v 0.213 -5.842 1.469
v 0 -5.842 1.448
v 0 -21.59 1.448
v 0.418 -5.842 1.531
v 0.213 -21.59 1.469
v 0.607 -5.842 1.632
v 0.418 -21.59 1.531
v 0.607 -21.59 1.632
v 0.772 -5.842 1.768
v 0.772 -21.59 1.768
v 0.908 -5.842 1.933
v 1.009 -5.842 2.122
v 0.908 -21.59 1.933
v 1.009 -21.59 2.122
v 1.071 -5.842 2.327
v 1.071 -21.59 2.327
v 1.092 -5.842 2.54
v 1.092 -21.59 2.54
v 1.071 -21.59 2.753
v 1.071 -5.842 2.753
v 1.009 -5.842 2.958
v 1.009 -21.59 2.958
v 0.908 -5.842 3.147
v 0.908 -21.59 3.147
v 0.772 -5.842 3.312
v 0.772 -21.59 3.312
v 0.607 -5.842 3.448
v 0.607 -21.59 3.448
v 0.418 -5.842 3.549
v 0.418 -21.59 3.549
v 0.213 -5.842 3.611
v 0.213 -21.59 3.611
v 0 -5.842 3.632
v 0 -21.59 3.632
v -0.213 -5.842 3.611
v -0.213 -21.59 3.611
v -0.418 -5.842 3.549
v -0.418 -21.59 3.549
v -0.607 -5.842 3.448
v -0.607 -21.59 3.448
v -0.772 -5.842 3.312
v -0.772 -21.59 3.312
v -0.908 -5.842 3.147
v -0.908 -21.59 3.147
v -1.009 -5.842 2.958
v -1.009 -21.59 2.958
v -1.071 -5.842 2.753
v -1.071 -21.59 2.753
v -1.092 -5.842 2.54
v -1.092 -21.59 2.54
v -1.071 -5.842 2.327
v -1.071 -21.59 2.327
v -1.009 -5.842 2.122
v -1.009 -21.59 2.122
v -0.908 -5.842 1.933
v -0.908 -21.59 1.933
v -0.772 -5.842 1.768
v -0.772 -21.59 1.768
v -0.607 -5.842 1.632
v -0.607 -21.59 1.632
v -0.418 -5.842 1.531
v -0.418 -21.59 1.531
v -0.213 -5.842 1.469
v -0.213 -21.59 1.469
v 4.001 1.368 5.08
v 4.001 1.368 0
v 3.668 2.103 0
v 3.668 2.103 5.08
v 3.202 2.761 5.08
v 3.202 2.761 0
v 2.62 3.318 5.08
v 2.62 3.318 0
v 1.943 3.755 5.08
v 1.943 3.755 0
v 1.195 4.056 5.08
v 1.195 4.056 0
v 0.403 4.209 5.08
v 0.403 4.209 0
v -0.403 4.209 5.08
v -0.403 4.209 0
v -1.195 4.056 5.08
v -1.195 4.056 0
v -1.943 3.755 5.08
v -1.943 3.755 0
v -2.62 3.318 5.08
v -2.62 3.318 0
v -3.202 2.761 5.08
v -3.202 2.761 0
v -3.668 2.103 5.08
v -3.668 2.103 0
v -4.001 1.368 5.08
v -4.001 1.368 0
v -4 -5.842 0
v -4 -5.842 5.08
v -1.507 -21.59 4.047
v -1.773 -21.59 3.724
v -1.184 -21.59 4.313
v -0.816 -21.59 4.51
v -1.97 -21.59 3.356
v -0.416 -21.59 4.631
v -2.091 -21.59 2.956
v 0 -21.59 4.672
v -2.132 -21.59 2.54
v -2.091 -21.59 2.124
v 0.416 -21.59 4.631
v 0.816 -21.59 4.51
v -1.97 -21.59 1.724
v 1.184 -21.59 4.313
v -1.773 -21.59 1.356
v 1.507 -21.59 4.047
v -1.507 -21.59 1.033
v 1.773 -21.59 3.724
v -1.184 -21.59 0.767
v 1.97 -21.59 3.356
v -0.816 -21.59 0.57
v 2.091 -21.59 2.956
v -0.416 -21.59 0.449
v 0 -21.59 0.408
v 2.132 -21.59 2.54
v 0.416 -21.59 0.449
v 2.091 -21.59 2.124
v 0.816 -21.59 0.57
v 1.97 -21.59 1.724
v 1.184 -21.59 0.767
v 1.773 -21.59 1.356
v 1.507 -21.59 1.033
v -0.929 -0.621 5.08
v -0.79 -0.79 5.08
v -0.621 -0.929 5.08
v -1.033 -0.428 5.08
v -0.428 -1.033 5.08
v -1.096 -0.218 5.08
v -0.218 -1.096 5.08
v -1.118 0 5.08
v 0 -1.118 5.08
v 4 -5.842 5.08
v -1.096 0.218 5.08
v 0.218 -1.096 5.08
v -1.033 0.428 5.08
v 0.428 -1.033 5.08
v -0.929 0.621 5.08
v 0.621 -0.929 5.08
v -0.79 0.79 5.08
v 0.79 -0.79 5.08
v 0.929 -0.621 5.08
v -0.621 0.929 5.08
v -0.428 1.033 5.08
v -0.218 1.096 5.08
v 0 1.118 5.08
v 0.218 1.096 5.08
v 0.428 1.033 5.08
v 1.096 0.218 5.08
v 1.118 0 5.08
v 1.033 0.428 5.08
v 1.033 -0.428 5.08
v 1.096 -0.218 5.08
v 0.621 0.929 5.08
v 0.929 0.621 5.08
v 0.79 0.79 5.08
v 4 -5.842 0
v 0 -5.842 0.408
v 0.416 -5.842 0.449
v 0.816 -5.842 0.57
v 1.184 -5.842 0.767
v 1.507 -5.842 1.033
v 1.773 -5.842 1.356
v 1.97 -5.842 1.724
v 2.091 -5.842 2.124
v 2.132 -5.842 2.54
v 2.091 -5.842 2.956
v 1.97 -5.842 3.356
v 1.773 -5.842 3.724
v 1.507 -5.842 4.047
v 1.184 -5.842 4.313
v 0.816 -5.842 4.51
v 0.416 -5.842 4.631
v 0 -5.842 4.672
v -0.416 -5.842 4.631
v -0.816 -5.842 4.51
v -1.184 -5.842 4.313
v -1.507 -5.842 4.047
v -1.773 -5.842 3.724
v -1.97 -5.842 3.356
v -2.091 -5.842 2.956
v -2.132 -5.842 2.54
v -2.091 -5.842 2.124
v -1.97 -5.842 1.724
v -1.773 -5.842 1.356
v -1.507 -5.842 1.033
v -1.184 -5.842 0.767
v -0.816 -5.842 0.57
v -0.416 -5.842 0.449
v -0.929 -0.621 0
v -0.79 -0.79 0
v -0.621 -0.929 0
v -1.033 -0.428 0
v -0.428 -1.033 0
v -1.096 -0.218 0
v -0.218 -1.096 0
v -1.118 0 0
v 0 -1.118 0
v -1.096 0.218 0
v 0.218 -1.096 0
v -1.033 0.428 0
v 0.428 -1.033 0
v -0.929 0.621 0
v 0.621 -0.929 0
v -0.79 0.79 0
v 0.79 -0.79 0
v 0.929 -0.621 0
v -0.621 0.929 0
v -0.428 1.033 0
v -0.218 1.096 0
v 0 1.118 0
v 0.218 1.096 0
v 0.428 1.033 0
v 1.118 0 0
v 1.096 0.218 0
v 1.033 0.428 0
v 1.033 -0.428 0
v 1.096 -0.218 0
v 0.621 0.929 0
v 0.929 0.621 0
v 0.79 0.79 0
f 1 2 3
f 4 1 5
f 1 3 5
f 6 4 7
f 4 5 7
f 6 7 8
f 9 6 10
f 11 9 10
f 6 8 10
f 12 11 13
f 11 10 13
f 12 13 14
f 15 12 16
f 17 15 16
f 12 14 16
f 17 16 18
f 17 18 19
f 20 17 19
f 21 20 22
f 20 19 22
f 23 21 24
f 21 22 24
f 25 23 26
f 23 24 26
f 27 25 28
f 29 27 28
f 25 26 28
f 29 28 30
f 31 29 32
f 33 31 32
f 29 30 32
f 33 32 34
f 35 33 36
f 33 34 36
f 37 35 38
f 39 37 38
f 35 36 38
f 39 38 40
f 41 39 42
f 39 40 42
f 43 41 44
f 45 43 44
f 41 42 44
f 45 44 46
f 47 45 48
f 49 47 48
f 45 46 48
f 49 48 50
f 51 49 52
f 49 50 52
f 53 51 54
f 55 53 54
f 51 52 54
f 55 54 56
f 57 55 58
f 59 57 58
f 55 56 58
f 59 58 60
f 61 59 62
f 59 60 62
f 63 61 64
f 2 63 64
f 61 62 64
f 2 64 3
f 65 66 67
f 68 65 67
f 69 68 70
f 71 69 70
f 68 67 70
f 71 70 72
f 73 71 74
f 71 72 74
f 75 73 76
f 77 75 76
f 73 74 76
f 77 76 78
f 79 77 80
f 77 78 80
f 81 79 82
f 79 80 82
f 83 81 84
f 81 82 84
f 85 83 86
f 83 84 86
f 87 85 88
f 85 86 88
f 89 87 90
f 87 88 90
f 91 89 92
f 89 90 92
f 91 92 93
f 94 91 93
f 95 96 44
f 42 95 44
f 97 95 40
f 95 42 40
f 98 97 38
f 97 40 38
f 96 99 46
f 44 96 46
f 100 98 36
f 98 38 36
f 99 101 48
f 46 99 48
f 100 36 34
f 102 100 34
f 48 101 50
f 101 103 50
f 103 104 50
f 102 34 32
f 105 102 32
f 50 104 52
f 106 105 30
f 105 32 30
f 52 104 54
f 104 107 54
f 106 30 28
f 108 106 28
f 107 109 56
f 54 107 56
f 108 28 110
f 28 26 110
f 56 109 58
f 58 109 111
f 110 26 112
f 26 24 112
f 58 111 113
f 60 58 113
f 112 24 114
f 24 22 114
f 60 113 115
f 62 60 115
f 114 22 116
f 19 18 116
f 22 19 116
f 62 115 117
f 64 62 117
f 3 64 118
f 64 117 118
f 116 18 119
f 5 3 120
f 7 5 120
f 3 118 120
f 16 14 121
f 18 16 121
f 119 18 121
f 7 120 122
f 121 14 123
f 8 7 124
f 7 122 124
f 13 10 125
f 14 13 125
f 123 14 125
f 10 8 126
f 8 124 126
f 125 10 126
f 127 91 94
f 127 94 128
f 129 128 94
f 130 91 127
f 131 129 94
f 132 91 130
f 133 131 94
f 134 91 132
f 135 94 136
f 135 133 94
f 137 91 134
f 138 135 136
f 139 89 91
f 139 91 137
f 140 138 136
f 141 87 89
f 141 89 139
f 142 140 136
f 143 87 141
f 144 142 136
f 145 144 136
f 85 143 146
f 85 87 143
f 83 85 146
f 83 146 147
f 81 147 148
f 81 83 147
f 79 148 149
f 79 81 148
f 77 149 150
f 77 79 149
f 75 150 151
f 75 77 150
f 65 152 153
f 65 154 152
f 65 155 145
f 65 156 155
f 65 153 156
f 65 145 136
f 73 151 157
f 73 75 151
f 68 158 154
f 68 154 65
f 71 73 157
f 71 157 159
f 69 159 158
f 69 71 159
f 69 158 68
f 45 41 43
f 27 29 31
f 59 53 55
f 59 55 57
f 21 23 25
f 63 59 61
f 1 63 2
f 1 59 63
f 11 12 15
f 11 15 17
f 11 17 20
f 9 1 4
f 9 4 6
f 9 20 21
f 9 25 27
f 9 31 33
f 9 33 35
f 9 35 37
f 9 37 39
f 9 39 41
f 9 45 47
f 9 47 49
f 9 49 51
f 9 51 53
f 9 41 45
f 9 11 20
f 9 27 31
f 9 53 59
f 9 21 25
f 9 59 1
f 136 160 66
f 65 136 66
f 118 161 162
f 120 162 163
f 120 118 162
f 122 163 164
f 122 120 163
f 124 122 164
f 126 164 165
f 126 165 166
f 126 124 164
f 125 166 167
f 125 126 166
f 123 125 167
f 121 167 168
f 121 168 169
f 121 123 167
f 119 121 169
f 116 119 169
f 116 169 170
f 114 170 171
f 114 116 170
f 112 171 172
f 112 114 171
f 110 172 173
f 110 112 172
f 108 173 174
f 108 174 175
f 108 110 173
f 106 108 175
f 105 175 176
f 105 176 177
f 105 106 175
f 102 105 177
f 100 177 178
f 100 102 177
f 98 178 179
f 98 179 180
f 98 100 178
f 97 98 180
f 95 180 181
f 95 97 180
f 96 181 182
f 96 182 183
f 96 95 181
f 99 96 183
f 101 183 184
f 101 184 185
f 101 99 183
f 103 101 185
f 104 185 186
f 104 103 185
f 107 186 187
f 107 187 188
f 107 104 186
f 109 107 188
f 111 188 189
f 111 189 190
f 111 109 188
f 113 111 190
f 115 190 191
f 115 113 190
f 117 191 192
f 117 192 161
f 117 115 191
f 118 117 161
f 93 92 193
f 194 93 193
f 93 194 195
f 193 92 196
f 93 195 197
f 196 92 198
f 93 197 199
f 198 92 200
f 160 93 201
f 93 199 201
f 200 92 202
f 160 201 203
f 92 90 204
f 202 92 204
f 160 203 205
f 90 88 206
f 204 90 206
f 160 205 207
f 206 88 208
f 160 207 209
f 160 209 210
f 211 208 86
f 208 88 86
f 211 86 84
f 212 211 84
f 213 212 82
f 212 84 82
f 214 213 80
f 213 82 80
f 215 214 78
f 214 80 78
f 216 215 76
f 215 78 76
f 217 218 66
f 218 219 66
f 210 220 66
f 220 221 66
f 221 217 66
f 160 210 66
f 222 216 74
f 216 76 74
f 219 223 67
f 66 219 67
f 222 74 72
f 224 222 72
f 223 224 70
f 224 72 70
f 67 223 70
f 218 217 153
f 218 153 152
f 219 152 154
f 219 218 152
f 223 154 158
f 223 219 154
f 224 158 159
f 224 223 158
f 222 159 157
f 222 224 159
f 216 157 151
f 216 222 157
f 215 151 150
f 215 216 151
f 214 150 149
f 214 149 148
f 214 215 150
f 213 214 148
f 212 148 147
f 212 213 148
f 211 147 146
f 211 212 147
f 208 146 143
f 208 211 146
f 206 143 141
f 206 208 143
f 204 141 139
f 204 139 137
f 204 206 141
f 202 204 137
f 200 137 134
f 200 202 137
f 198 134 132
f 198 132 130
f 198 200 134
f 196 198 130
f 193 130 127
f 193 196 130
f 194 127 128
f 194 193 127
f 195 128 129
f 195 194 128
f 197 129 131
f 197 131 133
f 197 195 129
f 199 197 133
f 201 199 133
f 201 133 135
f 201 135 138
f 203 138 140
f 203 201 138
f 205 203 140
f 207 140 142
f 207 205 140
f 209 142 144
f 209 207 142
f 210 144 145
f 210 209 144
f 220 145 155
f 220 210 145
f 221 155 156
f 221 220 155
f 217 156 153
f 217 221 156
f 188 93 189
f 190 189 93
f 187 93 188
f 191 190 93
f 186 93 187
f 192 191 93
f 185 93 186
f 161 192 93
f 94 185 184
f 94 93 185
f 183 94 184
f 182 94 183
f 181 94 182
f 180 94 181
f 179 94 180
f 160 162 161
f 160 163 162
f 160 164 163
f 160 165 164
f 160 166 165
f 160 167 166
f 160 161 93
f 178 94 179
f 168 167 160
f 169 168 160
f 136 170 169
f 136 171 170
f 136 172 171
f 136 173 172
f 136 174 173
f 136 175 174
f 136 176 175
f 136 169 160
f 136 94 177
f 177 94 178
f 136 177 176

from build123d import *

# Parameters (mm, degrees)
SKETCH1_R           = 1.1176
BOSS_EXTRUDE1_DEPTH = 5.08
SKETCH2_R           = 1.0922
CUT_EXTRUDE1_DEPTH  = 15.748
SKETCH3_W           = 8.001
SKETCH3_H           = 5.08
SKETCH3_R           = 2.131785714
CUT_EXTRUDE2_DEPTH  = 15.748


with BuildPart() as part:
    # Sketch1 → Boss-Extrude1 (new body)
    with BuildSketch(Plane.XY):
        with BuildLine():
            Line((4.0005, -21.59), (4.0005, 1.368360053))
            ThreePointArc((4.0005, 1.368360053), (0, 4.228050317), (-4.0005, 1.368360053))
            Line((-4.0005, 1.368360053), (-4.0005, -21.59))
            Line((-4.0005, -21.59), (4.0005, -21.59))
        make_face()
        Circle(SKETCH1_R, mode=Mode.SUBTRACT)
    extrude(amount=BOSS_EXTRUDE1_DEPTH)

    # Sketch2 → Cut-Extrude1 (cut)
    with BuildSketch(Plane.XZ.offset(21.59)):
        with Locations(Location((0, 2.54, 0), (0, 0, 270))):
            Circle(SKETCH2_R)
    extrude(amount=-CUT_EXTRUDE1_DEPTH, mode=Mode.SUBTRACT)

    # Sketch3 → Cut-Extrude2 (cut)
    with BuildSketch(Plane.XZ.offset(21.59)):
        with Locations((0, 2.54)):
            Rectangle(SKETCH3_W, SKETCH3_H)
        with Locations(Location((0, 2.54, 0), (0, 0, 270))):
            Circle(SKETCH3_R, mode=Mode.SUBTRACT)
    extrude(amount=-CUT_EXTRUDE2_DEPTH, mode=Mode.SUBTRACT)


solid = part.part
